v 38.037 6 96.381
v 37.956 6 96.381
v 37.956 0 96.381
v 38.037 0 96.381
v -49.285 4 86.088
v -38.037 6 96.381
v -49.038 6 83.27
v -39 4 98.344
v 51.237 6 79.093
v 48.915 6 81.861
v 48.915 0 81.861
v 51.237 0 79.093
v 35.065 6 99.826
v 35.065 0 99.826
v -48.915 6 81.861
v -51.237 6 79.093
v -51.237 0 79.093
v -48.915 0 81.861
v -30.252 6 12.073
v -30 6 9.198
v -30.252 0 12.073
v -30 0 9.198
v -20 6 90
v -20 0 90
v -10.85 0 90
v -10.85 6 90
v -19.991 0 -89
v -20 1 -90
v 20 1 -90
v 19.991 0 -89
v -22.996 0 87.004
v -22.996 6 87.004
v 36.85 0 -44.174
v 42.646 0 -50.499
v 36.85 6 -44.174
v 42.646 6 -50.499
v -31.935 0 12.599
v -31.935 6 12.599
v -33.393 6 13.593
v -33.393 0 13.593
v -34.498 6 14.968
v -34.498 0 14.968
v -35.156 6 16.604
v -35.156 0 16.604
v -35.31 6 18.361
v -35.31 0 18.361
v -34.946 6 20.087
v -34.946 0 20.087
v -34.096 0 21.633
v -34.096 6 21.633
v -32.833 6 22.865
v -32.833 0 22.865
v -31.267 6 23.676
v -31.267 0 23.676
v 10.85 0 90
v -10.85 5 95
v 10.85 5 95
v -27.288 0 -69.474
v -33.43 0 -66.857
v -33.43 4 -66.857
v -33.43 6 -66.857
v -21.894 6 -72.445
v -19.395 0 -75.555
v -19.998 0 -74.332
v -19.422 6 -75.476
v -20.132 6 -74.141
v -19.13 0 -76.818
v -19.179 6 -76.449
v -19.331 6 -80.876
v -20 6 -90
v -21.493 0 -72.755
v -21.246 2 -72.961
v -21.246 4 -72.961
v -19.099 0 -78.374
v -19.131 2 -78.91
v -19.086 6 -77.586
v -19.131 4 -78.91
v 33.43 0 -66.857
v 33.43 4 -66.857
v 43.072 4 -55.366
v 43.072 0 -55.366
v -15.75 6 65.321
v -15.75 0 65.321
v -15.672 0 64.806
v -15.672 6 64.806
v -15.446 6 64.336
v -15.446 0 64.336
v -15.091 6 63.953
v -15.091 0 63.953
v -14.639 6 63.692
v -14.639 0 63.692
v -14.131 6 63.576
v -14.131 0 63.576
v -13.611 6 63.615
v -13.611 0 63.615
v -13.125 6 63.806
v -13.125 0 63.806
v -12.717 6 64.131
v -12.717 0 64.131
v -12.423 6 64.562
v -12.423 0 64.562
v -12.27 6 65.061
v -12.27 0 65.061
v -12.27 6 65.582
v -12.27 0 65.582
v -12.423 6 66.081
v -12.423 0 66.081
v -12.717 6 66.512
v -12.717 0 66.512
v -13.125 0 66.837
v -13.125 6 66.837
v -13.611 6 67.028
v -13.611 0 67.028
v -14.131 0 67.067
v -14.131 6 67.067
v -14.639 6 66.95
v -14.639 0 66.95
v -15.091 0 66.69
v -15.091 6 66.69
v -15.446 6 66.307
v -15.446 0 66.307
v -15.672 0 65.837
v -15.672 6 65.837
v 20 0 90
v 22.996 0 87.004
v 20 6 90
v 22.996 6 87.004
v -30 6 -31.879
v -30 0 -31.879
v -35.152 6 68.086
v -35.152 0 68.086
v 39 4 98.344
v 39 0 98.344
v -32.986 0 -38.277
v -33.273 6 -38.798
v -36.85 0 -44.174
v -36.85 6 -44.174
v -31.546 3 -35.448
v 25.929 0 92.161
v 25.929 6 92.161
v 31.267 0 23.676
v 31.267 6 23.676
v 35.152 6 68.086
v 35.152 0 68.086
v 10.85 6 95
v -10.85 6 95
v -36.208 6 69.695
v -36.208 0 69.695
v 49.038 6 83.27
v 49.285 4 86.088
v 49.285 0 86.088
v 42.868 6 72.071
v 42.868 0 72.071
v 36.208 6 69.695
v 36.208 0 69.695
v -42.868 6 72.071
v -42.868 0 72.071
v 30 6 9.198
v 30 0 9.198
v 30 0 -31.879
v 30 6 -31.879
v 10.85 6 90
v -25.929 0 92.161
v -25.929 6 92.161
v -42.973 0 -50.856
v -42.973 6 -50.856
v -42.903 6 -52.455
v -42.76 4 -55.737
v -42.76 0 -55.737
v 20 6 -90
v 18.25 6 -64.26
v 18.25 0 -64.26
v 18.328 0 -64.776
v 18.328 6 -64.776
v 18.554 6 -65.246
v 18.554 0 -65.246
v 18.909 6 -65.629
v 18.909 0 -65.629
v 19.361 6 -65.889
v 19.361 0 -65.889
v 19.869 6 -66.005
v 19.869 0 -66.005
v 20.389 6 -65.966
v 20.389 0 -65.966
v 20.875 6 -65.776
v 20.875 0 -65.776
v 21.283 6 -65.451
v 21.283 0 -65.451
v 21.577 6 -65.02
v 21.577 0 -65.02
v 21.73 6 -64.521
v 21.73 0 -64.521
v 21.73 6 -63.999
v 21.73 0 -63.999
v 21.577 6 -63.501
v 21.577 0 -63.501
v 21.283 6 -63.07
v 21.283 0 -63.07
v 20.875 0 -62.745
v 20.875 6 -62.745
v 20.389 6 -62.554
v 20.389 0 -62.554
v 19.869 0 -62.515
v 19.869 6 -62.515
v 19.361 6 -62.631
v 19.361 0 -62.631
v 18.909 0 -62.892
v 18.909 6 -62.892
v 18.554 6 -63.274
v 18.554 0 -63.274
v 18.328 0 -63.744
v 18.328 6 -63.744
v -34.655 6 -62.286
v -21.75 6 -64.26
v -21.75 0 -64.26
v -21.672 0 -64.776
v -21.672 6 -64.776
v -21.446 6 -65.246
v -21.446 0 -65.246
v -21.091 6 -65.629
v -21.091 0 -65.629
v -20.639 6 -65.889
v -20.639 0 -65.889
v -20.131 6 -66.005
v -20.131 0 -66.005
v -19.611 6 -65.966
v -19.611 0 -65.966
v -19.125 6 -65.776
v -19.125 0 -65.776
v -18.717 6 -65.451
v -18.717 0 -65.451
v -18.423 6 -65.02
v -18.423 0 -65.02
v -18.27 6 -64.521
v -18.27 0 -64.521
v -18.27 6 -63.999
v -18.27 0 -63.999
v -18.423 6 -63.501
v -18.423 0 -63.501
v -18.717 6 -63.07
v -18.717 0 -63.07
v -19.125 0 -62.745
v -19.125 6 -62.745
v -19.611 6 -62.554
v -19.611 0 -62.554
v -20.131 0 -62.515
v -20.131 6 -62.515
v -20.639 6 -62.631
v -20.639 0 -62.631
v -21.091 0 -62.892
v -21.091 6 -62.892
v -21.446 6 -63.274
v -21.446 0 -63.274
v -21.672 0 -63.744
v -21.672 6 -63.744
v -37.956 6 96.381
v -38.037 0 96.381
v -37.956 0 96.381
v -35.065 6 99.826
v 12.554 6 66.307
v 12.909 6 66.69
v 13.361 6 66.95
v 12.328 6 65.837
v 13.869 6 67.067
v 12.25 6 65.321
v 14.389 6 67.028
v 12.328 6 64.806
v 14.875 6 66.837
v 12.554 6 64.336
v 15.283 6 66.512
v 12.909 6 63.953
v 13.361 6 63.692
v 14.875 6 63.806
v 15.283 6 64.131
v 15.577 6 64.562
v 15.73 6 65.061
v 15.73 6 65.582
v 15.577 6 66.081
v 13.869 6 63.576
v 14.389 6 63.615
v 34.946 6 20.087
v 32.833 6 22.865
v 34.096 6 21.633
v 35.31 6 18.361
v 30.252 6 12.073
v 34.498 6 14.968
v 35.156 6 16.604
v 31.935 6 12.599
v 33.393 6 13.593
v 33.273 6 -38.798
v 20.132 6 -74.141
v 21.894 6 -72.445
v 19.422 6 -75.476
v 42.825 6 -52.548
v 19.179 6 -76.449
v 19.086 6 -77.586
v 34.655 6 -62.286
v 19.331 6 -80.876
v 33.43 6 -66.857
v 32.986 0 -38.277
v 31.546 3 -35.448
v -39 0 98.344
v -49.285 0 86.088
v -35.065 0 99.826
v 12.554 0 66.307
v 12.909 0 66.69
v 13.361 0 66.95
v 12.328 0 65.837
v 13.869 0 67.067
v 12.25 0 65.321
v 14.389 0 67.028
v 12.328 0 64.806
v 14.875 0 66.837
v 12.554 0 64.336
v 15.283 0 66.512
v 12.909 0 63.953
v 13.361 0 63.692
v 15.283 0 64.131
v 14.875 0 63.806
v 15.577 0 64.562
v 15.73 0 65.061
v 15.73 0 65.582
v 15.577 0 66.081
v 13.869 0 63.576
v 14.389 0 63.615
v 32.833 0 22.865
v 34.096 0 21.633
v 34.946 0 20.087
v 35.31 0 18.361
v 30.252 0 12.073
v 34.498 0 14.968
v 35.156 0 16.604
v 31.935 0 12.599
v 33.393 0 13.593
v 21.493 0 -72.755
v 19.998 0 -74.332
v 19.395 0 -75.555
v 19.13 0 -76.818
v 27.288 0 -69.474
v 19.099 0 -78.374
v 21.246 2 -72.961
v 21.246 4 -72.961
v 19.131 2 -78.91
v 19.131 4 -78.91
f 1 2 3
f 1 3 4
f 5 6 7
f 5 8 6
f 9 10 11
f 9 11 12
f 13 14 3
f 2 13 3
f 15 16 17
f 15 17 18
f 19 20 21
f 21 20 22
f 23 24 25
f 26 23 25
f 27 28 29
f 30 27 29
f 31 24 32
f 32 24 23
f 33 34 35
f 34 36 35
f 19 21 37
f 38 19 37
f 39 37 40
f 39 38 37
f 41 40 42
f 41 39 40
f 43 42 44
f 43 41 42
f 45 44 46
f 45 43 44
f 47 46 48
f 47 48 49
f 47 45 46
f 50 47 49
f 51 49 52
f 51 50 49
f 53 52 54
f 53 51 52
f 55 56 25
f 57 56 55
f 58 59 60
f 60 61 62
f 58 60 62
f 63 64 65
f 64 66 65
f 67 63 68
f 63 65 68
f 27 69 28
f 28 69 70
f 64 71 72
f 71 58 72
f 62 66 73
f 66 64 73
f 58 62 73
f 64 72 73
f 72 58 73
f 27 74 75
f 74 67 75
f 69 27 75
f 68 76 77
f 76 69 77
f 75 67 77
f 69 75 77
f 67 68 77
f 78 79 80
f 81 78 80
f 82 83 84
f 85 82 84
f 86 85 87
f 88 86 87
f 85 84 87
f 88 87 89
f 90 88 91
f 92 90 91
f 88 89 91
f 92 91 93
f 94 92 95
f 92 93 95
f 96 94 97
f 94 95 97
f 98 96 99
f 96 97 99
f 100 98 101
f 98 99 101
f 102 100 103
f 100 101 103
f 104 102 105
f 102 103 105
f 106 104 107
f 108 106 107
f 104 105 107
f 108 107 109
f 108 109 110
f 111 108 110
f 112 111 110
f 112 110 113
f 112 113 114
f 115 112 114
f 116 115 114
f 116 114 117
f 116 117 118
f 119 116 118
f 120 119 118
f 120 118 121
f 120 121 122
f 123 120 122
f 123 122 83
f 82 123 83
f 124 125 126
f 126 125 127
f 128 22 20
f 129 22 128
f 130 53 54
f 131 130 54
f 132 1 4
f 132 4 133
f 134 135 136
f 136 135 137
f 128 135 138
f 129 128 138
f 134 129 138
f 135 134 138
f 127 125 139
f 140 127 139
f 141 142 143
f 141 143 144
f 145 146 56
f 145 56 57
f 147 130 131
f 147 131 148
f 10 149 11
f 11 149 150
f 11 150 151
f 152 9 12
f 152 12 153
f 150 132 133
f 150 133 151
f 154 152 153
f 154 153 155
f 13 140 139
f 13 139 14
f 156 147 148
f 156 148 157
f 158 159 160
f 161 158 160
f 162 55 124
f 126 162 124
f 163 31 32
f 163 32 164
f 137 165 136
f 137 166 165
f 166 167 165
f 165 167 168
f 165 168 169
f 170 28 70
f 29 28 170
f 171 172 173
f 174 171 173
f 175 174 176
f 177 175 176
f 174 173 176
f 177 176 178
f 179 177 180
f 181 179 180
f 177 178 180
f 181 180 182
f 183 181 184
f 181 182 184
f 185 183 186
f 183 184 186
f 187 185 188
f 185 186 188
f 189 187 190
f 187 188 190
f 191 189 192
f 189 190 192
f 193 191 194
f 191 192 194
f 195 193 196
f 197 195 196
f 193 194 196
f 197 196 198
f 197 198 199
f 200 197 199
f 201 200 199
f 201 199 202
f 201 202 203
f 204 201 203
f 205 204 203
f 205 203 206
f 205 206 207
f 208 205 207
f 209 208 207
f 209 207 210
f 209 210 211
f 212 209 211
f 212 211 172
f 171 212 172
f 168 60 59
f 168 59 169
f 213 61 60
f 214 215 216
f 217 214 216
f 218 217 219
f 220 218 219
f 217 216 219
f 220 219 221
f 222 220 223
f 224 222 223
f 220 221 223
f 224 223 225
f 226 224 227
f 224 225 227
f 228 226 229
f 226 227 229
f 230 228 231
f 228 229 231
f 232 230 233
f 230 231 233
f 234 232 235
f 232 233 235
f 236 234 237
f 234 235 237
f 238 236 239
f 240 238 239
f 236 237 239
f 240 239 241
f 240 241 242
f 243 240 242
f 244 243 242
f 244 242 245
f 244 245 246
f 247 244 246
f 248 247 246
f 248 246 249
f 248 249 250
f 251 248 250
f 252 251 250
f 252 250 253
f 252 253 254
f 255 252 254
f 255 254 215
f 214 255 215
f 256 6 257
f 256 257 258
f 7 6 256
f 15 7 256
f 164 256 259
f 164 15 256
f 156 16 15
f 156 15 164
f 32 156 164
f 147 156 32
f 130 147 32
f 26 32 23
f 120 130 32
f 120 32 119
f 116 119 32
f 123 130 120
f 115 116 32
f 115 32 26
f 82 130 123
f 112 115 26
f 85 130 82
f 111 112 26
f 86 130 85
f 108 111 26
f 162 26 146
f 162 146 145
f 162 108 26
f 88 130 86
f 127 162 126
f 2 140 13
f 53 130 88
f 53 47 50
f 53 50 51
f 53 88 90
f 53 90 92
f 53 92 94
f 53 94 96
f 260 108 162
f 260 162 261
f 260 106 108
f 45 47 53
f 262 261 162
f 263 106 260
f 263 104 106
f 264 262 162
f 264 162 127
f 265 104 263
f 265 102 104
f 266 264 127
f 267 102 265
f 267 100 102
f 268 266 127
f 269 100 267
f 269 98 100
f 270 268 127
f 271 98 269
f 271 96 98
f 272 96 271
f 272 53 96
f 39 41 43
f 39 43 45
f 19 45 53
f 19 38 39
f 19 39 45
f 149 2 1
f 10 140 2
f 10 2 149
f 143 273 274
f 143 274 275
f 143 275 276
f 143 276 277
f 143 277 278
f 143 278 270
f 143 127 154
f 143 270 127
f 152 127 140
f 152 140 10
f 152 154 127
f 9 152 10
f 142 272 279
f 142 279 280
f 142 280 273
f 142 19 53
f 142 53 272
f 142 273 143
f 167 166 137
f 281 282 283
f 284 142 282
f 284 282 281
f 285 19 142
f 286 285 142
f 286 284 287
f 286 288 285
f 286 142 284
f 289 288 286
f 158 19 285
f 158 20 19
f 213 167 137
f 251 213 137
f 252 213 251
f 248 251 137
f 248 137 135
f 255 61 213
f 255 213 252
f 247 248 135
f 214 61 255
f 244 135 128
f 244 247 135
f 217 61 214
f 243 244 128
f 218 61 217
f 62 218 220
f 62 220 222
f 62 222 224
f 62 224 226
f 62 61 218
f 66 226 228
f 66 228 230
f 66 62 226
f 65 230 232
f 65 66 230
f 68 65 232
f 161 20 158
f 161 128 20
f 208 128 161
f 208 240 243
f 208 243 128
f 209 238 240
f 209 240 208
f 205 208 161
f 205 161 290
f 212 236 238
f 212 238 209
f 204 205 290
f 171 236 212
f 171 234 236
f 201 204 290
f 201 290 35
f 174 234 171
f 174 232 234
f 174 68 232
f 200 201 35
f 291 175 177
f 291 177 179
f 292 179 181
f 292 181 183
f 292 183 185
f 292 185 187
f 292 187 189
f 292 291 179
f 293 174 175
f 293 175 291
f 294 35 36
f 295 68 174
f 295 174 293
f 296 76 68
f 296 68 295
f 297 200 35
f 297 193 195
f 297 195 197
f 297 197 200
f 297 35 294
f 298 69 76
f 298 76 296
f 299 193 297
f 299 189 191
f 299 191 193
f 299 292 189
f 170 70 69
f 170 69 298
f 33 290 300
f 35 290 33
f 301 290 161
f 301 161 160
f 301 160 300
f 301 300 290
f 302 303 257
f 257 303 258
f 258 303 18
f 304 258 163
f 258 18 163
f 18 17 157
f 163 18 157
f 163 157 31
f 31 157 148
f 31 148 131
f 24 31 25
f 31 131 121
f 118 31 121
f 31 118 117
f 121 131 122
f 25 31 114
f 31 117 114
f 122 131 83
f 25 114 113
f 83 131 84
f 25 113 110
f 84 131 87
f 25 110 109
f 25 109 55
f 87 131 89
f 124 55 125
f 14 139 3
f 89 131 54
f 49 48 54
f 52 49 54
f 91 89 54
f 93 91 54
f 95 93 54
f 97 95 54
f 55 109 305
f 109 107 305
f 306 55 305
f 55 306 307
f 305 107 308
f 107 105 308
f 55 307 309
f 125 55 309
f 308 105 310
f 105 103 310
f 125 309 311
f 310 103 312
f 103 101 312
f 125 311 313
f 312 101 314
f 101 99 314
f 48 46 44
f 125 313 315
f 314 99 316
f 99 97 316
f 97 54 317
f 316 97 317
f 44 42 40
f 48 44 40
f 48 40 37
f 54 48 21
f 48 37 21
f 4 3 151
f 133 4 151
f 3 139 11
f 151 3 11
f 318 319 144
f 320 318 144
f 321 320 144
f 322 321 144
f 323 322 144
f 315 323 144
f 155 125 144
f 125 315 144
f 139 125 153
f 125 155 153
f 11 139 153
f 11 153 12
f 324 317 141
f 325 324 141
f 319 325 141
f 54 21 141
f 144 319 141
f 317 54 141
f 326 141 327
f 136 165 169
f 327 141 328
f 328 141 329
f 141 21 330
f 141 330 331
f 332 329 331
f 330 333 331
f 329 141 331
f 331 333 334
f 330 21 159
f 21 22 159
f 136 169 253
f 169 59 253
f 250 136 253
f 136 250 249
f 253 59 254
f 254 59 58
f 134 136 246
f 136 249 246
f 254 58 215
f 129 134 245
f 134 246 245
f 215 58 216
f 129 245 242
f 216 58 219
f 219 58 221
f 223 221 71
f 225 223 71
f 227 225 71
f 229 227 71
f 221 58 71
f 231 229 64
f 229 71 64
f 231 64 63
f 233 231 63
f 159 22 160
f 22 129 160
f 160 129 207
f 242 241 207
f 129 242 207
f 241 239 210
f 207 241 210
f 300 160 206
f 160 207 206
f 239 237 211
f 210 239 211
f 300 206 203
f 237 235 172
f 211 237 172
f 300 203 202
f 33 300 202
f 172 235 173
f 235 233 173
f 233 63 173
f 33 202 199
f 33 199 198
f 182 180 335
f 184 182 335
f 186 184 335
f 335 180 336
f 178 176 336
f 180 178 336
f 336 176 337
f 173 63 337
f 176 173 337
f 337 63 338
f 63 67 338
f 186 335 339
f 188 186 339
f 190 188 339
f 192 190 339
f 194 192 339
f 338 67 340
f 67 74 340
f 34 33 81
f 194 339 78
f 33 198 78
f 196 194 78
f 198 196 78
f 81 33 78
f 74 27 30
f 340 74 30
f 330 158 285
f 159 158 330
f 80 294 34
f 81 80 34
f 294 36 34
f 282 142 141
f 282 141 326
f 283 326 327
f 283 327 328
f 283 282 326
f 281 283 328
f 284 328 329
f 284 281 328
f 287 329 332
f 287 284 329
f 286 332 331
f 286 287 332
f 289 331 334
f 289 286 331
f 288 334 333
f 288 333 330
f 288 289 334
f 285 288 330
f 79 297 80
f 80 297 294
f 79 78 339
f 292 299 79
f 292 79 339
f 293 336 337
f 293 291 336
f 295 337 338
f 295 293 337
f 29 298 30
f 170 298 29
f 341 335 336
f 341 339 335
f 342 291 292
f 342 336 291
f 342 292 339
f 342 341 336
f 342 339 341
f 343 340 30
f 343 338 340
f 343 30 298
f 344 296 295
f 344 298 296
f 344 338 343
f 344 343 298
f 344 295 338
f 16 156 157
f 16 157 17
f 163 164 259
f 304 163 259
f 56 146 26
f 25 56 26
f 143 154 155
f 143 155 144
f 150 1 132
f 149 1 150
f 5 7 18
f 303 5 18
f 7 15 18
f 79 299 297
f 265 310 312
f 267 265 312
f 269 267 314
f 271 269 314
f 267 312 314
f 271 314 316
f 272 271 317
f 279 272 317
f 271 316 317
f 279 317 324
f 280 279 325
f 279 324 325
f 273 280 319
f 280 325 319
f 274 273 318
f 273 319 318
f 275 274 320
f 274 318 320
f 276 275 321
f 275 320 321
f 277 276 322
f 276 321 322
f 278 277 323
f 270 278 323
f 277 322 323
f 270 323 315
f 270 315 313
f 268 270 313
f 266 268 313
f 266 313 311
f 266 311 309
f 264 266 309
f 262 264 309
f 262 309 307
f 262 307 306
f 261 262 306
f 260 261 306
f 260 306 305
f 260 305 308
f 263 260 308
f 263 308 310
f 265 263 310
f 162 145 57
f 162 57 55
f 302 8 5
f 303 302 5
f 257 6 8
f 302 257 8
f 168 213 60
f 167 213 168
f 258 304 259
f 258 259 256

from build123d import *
from OCP.BRepFilletAPI import BRepFilletAPI_MakeChamfer

# Parameters (mm, degrees)
SKETCH1_W             = 60
SKETCH1_H             = 180
BOSS_EXTRUDE1_DEPTH   = 6
CHAMFER2_SIZE         = 10
BOSS_EXTRUDE3_DEPTH   = 6
BOSS_EXTRUDE4_DEPTH   = 6
CHAMFER14_SIZE        = 2
CHAMFER16_SIZE        = 7
CHAMFER16_SIZE2       = 56.79198309
CHAMFER17_SIZE        = 2
SKETCH59_W            = 21.7
SKETCH59_H            = 5
BOSS_EXTRUDE5_DEPTH   = 6
CHAMFER19_SIZE        = 5
CUT_EXTRUDE28_DEPTH   = 112.04216162
CHAMFER20_SIZE        = 3
CHAMFER20_SIZE2       = 3.484649721
CUT_EXTRUDE29_DEPTH   = 111.166083192
CHAMFER24_SIZE        = 1
CUT_EXTRUDE31_DEPTH   = 111.166083332
SKETCH66_R            = 6
BOSS_EXTRUDE6_DEPTH   = 6
BOSS_EXTRUDE7_DEPTH   = 6
BOSS_EXTRUDE8_DEPTH   = 6
BOSS_EXTRUDE9_DEPTH   = 6
F_3_0MM_DOWEL_HOLE3_D = 3.5


with BuildPart() as part:
    # Sketch1 → Boss-Extrude1 (new body)
    with BuildSketch(Plane(origin=(0, 0, 0), x_dir=(1, 0, 0), z_dir=(0, 1, 0))):
        Rectangle(SKETCH1_W, SKETCH1_H)
    extrude(amount=BOSS_EXTRUDE1_DEPTH)

    # Chamfer2
    chamfer2_edges = [part.edges().sort_by_distance(p)[0] for p in [
        (-30, 3, -90),
        (30, 3, -90),
        (30, 3, 90),
        (-30, 3, 90),
    ]]
    chamfer(chamfer2_edges, length=CHAMFER2_SIZE)

    # Sketch52 → Boss-Extrude3 (add, through all)
    with BuildSketch(Plane(origin=(0, 6, 0), x_dir=(1, 0, 0), z_dir=(0, 1, 0))):
        Polygon((45, 53.067924807), (36.85, 44.173760523), (30, 25.3535402), (30, 79.656998575), (33.429823026, 66.856724783), align=None)
        Polygon((-33.429823026, 66.856724783), (-45, 53.067924807), (-36.85, 44.173760523), (-30, 25.3535402), (-30, 79.656998575), align=None)
    extrude(amount=-BOSS_EXTRUDE3_DEPTH)

    # Sketch53 → Boss-Extrude4 (add, through all)
    with BuildSketch(Plane(origin=(0, 6, 0), x_dir=(1, 0, 0), z_dir=(0, 1, 0))):
        Polygon((30, -65.989627063), (30, -80), (39, -98.344262241), (51.212964584, -83.789417822), align=None)
        Polygon((-51.212964584, -83.789417822), (-30, -65.989627063), (-30, -80), (-39, -98.344262241), align=None)
    extrude(amount=-BOSS_EXTRUDE4_DEPTH)

    # Chamfer14
    chamfer14_edges = [part.edges().sort_by_distance(p)[0] for p in [
        (-45.106482292, 6, 91.066840031),
        (45.106482292, 6, 91.066840031),
    ]]
    chamfer(chamfer14_edges, length=CHAMFER14_SIZE)

    # Chamfer16: one chamfer whose edges measure the first distance from different faces: ONE call of the kernel's chamfer builder (chamfer() names one face for all edges)
    chamfer16_edges_1 = [part.edges().sort_by_distance(p)[0] for p in [
        (-30, 3, 65.989627063),
    ]]
    chamfer16_side_1 = [part.faces().sort_by_distance(p)[0] for p in [
        (-40.483474971, 2.971570606, 74.786307045),
    ]]
    chamfer16_edges_2 = [part.edges().sort_by_distance(p)[0] for p in [
        (30, 3, 65.989627063),
    ]]
    chamfer16_side_2 = [part.faces().sort_by_distance(p)[0] for p in [
        (40.483474971, 2.971570606, 74.786307045),
    ]]
    chamfer16 = BRepFilletAPI_MakeChamfer(part.part.solid().wrapped)
    for e in chamfer16_edges_1:
        chamfer16.Add(CHAMFER16_SIZE, CHAMFER16_SIZE2, e.wrapped, chamfer16_side_1[0].wrapped)  # the first distance lies on this face
    for e in chamfer16_edges_2:
        chamfer16.Add(CHAMFER16_SIZE, CHAMFER16_SIZE2, e.wrapped, chamfer16_side_2[0].wrapped)  # the first distance lies on this face
    add(Compound.cast(chamfer16.Shape()), mode=Mode.REPLACE)

    # Chamfer17
    chamfer17_edges = [part.edges().sort_by_distance(p)[0] for p in [
        (39.214911513, 6, -59.962324795),
        (-39.214911513, 6, -59.962324795),
    ]]
    chamfer(chamfer17_edges, length=CHAMFER17_SIZE)

    # Sketch59 → Boss-Extrude5 (add, through all)
    with BuildSketch(Plane(origin=(0, 6, 0), x_dir=(1, 0, 0), z_dir=(0, 1, 0))):
        with Locations((0, -92.5)):
            Rectangle(SKETCH59_W, SKETCH59_H)
    extrude(amount=-BOSS_EXTRUDE5_DEPTH)

    # Chamfer19
    chamfer19_edges = [part.edges().sort_by_distance(p)[0] for p in [
        (0, 0, 95),
    ]]
    chamfer(chamfer19_edges, length=CHAMFER19_SIZE)

    # Sketch61 → Cut-Extrude28 (cut, through all)
    with BuildSketch(Plane.XZ):
        Polygon((30, -79.656998575), (20, -90), (30, -80), align=None)
        Polygon((-30, -80), (-30, -79.656998575), (-20, -90), align=None)
    extrude(amount=-CUT_EXTRUDE28_DEPTH, mode=Mode.SUBTRACT)

    # Chamfer20: one chamfer whose edges measure the first distance from different faces: ONE call of the kernel's chamfer builder (chamfer() names one face for all edges)
    chamfer20_edges_1 = [part.edges().sort_by_distance(p)[0] for p in [
        (-45, 2, -53.067924807),
    ]]
    chamfer20_side_1 = [part.faces().sort_by_distance(p)[0] for p in [
        (-40.821197815, 2.933105821, -48.507562458),
    ]]
    chamfer20_edges_2 = [part.edges().sort_by_distance(p)[0] for p in [
        (45, 2, -53.067924807),
    ]]
    chamfer20_side_2 = [part.faces().sort_by_distance(p)[0] for p in [
        (39.214911513, 2, -59.962324795),
    ]]
    chamfer20_edges_3 = [part.edges().sort_by_distance(p)[0] for p in [
        (-51.212964584, 2, 83.789417822),
        (51.212964584, 2, 83.789417822),
    ]]
    chamfer20 = BRepFilletAPI_MakeChamfer(part.part.solid().wrapped)
    for e in chamfer20_edges_1:
        chamfer20.Add(CHAMFER20_SIZE, CHAMFER20_SIZE2, e.wrapped, chamfer20_side_1[0].wrapped)  # the first distance lies on this face
    for e in chamfer20_edges_2:
        chamfer20.Add(CHAMFER20_SIZE, CHAMFER20_SIZE2, e.wrapped, chamfer20_side_2[0].wrapped)  # the first distance lies on this face
    for e in chamfer20_edges_3:
        chamfer20.Add(CHAMFER20_SIZE, e.wrapped)
    add(Compound.cast(chamfer20.Shape()), mode=Mode.REPLACE)

    # Sketch62 → Cut-Extrude29 (cut, through all)
    with BuildSketch(Plane(origin=(0, 6, 0), x_dir=(1, 0, 0), z_dir=(0, 1, 0))):
        with BuildLine():
            Line((20, 90), (30, 79.656998575))
            Line((30, 79.656998575), (33.429823026, 66.856724783))
            add(Edge.make_bspline(
                [(33.429823026, 66.856724783), (13.849706238, 74.804707739), (20, 74.573823319), (20, 90)],
                knots=[0, 0, 0, 0, 1, 1, 1, 1], degree=3))
        make_face()
        with BuildLine():
            Line((-30, 79.656998575), (-33.429823026, 66.856724783))
            add(Edge.make_bspline(
                [(-33.429823026, 66.856724783), (-13.849706238, 74.804707739), (-20, 74.573823319), (-20, 90)],
                knots=[0, 0, 0, 0, 1, 1, 1, 1], degree=3))
            Line((-20, 90), (-30, 79.656998575))
        make_face()
    extrude(amount=-CUT_EXTRUDE29_DEPTH, mode=Mode.SUBTRACT)

    # Chamfer24
    chamfer24_edges = [part.edges().sort_by_distance(p)[0] for p in [
        (0, 0, -90),
    ]]
    chamfer(chamfer24_edges, length=CHAMFER24_SIZE)

    # Sketch64 → Cut-Extrude31 (cut, through all)
    with BuildSketch(Plane(origin=(0, 6, 0), x_dir=(1, 0, 0), z_dir=(0, 1, 0))):
        with BuildLine():
            Line((36.85, 44.173760523), (25, 5.3535402))
            add(Edge.make_bspline(
                [(25, 5.3535402), (25, 11.888533403), (26.675205792, 28.424746849), (35.495075594, 42.695120001), (36.85, 44.173760523)],
                knots=[0, 0, 0, 0, 0.750989917, 1, 1, 1, 1], degree=3))
        make_face()
        with BuildLine():
            Line((-36.85, 44.173760523), (-25, 5.3535402))
            add(Edge.make_bspline(
                [(-25, 5.3535402), (-25, 11.888533403), (-26.675205792, 28.424746849), (-35.495075594, 42.695120001), (-36.85, 44.173760523)],
                knots=[0, 0, 0, 0, 0.750989917, 1, 1, 1, 1], degree=3))
        make_face()
    extrude(amount=-CUT_EXTRUDE31_DEPTH, mode=Mode.SUBTRACT)

    # Sketch66 → Boss-Extrude6 (add)
    with BuildSketch(Plane(origin=(0, 6, 0), x_dir=(1, 0, 0), z_dir=(0, 1, 0))):
        with Locations((29.320888862, -18)):
            Circle(SKETCH66_R)
        with BuildLine():
            ThreePointArc((25, -13.837078017), (26.973287097, -12.478336668), (29.320888862, -12))
            Line((29.320888862, -12), (25, -12))
            Line((25, -12), (25, -13.837078017))
        make_face()
        with BuildLine():
            Line((25, -24), (29.320888862, -24))
            ThreePointArc((29.320888862, -24), (26.973287097, -23.521663332), (25, -22.162921983))
            Line((25, -22.162921983), (25, -24))
        make_face()
        with Locations((-29.320888862, -18)):
            Circle(SKETCH66_R)
        with BuildLine():
            Line((-25, -12), (-29.320888862, -12))
            ThreePointArc((-29.320888862, -12), (-26.973287097, -12.478336668), (-25, -13.837078017))
            Line((-25, -13.837078017), (-25, -12))
        make_face()
        with BuildLine():
            ThreePointArc((-25, -22.162921983), (-26.973287097, -23.521663332), (-29.320888862, -24))
            Line((-29.320888862, -24), (-25, -24))
            Line((-25, -24), (-25, -22.162921983))
        make_face()
    extrude(amount=-BOSS_EXTRUDE6_DEPTH)

    # Sketch67 → Boss-Extrude7 (add)
    with BuildSketch(Plane.XZ):
        with BuildLine():
            Line((30, -21.733379998), (30, -31.878802778))
            add(Edge.make_bspline(
                [(30, -31.878802778), (26.006043433, -21.746256389), (25, -11.197434735), (25, -5.3535402)],
                knots=[0.328429926, 0.328429926, 0.328429926, 0.328429926, 1, 1, 1, 1], degree=3))
            Line((25, -5.3535402), (30, -21.733379998))
        make_face()
        with BuildLine():
            Line((-30, -21.733379998), (-30, -31.878802778))
            add(Edge.make_bspline(
                [(-25, -5.3535402), (-25, -11.197434735), (-26.006043433, -21.746256389), (-30, -31.878802778)],
                knots=[0, 0, 0, 0, 0.671570074, 0.671570074, 0.671570074, 0.671570074], degree=3))
            Line((-25, -5.3535402), (-30, -21.733379998))
        make_face()
    extrude(amount=-BOSS_EXTRUDE7_DEPTH)

    # Sketch70 → Boss-Extrude8 (add)
    with BuildSketch(Plane(origin=(0, 6, 0), x_dir=(1, 0, 0), z_dir=(0, 1, 0))):
        Polygon((-35.152040134, -68.085732174), (-36.207663424, -69.695157895), (-42.867802278, -72.070563218), (-51.23722065, -79.093339087), (-48.914831255, -81.861054993), (-35.362311102, -70.489140331), align=None)
        Polygon((-37.956015914, -96.380824876), (-29.919310924, -80), (-22.966994839, -86.952316085), (-25.929369827, -92.160839448), (-35.064832642, -99.826402927), align=None)
        Polygon((35.362311102, -70.489140331), (48.914831255, -81.861054993), (51.23722065, -79.093339087), (42.867802278, -72.070563218), (36.207663424, -69.695157895), (35.152040134, -68.085732174), align=None)
        Polygon((37.956015914, -96.380824876), (29.919310924, -80), (22.966994839, -86.952316085), (25.929369827, -92.160839448), (35.064832642, -99.826402927), align=None)
    extrude(amount=-BOSS_EXTRUDE8_DEPTH)

    # Sketch71 → Boss-Extrude9 (add)
    with BuildSketch(Plane(origin=(0, 6, 0), x_dir=(1, 0, 0), z_dir=(0, 1, 0))):
        Polygon((-38.03670499, -96.380824876), (-37.956015914, -96.380824876), (-29.945868659, -80.054131341), (-30, -80), align=None)
        Polygon((29.945868659, -80.054131341), (37.956015914, -96.380824876), (38.03670499, -96.380824876), (30, -80), align=None)
    extrude(amount=-BOSS_EXTRUDE9_DEPTH)

    # Ø3.0mm Dowel Hole3 (through all)
    with Locations(Plane(origin=(0, 6, 0), x_dir=(1, 0, 0), z_dir=(0, 1, 0))):
        with Locations((20, 64.260302334), (-20, 64.260302334), (-14, -65.321451812), (14, -65.321451812)):
            Hole(F_3_0MM_DOWEL_HOLE3_D / 2)


solid = part.part
